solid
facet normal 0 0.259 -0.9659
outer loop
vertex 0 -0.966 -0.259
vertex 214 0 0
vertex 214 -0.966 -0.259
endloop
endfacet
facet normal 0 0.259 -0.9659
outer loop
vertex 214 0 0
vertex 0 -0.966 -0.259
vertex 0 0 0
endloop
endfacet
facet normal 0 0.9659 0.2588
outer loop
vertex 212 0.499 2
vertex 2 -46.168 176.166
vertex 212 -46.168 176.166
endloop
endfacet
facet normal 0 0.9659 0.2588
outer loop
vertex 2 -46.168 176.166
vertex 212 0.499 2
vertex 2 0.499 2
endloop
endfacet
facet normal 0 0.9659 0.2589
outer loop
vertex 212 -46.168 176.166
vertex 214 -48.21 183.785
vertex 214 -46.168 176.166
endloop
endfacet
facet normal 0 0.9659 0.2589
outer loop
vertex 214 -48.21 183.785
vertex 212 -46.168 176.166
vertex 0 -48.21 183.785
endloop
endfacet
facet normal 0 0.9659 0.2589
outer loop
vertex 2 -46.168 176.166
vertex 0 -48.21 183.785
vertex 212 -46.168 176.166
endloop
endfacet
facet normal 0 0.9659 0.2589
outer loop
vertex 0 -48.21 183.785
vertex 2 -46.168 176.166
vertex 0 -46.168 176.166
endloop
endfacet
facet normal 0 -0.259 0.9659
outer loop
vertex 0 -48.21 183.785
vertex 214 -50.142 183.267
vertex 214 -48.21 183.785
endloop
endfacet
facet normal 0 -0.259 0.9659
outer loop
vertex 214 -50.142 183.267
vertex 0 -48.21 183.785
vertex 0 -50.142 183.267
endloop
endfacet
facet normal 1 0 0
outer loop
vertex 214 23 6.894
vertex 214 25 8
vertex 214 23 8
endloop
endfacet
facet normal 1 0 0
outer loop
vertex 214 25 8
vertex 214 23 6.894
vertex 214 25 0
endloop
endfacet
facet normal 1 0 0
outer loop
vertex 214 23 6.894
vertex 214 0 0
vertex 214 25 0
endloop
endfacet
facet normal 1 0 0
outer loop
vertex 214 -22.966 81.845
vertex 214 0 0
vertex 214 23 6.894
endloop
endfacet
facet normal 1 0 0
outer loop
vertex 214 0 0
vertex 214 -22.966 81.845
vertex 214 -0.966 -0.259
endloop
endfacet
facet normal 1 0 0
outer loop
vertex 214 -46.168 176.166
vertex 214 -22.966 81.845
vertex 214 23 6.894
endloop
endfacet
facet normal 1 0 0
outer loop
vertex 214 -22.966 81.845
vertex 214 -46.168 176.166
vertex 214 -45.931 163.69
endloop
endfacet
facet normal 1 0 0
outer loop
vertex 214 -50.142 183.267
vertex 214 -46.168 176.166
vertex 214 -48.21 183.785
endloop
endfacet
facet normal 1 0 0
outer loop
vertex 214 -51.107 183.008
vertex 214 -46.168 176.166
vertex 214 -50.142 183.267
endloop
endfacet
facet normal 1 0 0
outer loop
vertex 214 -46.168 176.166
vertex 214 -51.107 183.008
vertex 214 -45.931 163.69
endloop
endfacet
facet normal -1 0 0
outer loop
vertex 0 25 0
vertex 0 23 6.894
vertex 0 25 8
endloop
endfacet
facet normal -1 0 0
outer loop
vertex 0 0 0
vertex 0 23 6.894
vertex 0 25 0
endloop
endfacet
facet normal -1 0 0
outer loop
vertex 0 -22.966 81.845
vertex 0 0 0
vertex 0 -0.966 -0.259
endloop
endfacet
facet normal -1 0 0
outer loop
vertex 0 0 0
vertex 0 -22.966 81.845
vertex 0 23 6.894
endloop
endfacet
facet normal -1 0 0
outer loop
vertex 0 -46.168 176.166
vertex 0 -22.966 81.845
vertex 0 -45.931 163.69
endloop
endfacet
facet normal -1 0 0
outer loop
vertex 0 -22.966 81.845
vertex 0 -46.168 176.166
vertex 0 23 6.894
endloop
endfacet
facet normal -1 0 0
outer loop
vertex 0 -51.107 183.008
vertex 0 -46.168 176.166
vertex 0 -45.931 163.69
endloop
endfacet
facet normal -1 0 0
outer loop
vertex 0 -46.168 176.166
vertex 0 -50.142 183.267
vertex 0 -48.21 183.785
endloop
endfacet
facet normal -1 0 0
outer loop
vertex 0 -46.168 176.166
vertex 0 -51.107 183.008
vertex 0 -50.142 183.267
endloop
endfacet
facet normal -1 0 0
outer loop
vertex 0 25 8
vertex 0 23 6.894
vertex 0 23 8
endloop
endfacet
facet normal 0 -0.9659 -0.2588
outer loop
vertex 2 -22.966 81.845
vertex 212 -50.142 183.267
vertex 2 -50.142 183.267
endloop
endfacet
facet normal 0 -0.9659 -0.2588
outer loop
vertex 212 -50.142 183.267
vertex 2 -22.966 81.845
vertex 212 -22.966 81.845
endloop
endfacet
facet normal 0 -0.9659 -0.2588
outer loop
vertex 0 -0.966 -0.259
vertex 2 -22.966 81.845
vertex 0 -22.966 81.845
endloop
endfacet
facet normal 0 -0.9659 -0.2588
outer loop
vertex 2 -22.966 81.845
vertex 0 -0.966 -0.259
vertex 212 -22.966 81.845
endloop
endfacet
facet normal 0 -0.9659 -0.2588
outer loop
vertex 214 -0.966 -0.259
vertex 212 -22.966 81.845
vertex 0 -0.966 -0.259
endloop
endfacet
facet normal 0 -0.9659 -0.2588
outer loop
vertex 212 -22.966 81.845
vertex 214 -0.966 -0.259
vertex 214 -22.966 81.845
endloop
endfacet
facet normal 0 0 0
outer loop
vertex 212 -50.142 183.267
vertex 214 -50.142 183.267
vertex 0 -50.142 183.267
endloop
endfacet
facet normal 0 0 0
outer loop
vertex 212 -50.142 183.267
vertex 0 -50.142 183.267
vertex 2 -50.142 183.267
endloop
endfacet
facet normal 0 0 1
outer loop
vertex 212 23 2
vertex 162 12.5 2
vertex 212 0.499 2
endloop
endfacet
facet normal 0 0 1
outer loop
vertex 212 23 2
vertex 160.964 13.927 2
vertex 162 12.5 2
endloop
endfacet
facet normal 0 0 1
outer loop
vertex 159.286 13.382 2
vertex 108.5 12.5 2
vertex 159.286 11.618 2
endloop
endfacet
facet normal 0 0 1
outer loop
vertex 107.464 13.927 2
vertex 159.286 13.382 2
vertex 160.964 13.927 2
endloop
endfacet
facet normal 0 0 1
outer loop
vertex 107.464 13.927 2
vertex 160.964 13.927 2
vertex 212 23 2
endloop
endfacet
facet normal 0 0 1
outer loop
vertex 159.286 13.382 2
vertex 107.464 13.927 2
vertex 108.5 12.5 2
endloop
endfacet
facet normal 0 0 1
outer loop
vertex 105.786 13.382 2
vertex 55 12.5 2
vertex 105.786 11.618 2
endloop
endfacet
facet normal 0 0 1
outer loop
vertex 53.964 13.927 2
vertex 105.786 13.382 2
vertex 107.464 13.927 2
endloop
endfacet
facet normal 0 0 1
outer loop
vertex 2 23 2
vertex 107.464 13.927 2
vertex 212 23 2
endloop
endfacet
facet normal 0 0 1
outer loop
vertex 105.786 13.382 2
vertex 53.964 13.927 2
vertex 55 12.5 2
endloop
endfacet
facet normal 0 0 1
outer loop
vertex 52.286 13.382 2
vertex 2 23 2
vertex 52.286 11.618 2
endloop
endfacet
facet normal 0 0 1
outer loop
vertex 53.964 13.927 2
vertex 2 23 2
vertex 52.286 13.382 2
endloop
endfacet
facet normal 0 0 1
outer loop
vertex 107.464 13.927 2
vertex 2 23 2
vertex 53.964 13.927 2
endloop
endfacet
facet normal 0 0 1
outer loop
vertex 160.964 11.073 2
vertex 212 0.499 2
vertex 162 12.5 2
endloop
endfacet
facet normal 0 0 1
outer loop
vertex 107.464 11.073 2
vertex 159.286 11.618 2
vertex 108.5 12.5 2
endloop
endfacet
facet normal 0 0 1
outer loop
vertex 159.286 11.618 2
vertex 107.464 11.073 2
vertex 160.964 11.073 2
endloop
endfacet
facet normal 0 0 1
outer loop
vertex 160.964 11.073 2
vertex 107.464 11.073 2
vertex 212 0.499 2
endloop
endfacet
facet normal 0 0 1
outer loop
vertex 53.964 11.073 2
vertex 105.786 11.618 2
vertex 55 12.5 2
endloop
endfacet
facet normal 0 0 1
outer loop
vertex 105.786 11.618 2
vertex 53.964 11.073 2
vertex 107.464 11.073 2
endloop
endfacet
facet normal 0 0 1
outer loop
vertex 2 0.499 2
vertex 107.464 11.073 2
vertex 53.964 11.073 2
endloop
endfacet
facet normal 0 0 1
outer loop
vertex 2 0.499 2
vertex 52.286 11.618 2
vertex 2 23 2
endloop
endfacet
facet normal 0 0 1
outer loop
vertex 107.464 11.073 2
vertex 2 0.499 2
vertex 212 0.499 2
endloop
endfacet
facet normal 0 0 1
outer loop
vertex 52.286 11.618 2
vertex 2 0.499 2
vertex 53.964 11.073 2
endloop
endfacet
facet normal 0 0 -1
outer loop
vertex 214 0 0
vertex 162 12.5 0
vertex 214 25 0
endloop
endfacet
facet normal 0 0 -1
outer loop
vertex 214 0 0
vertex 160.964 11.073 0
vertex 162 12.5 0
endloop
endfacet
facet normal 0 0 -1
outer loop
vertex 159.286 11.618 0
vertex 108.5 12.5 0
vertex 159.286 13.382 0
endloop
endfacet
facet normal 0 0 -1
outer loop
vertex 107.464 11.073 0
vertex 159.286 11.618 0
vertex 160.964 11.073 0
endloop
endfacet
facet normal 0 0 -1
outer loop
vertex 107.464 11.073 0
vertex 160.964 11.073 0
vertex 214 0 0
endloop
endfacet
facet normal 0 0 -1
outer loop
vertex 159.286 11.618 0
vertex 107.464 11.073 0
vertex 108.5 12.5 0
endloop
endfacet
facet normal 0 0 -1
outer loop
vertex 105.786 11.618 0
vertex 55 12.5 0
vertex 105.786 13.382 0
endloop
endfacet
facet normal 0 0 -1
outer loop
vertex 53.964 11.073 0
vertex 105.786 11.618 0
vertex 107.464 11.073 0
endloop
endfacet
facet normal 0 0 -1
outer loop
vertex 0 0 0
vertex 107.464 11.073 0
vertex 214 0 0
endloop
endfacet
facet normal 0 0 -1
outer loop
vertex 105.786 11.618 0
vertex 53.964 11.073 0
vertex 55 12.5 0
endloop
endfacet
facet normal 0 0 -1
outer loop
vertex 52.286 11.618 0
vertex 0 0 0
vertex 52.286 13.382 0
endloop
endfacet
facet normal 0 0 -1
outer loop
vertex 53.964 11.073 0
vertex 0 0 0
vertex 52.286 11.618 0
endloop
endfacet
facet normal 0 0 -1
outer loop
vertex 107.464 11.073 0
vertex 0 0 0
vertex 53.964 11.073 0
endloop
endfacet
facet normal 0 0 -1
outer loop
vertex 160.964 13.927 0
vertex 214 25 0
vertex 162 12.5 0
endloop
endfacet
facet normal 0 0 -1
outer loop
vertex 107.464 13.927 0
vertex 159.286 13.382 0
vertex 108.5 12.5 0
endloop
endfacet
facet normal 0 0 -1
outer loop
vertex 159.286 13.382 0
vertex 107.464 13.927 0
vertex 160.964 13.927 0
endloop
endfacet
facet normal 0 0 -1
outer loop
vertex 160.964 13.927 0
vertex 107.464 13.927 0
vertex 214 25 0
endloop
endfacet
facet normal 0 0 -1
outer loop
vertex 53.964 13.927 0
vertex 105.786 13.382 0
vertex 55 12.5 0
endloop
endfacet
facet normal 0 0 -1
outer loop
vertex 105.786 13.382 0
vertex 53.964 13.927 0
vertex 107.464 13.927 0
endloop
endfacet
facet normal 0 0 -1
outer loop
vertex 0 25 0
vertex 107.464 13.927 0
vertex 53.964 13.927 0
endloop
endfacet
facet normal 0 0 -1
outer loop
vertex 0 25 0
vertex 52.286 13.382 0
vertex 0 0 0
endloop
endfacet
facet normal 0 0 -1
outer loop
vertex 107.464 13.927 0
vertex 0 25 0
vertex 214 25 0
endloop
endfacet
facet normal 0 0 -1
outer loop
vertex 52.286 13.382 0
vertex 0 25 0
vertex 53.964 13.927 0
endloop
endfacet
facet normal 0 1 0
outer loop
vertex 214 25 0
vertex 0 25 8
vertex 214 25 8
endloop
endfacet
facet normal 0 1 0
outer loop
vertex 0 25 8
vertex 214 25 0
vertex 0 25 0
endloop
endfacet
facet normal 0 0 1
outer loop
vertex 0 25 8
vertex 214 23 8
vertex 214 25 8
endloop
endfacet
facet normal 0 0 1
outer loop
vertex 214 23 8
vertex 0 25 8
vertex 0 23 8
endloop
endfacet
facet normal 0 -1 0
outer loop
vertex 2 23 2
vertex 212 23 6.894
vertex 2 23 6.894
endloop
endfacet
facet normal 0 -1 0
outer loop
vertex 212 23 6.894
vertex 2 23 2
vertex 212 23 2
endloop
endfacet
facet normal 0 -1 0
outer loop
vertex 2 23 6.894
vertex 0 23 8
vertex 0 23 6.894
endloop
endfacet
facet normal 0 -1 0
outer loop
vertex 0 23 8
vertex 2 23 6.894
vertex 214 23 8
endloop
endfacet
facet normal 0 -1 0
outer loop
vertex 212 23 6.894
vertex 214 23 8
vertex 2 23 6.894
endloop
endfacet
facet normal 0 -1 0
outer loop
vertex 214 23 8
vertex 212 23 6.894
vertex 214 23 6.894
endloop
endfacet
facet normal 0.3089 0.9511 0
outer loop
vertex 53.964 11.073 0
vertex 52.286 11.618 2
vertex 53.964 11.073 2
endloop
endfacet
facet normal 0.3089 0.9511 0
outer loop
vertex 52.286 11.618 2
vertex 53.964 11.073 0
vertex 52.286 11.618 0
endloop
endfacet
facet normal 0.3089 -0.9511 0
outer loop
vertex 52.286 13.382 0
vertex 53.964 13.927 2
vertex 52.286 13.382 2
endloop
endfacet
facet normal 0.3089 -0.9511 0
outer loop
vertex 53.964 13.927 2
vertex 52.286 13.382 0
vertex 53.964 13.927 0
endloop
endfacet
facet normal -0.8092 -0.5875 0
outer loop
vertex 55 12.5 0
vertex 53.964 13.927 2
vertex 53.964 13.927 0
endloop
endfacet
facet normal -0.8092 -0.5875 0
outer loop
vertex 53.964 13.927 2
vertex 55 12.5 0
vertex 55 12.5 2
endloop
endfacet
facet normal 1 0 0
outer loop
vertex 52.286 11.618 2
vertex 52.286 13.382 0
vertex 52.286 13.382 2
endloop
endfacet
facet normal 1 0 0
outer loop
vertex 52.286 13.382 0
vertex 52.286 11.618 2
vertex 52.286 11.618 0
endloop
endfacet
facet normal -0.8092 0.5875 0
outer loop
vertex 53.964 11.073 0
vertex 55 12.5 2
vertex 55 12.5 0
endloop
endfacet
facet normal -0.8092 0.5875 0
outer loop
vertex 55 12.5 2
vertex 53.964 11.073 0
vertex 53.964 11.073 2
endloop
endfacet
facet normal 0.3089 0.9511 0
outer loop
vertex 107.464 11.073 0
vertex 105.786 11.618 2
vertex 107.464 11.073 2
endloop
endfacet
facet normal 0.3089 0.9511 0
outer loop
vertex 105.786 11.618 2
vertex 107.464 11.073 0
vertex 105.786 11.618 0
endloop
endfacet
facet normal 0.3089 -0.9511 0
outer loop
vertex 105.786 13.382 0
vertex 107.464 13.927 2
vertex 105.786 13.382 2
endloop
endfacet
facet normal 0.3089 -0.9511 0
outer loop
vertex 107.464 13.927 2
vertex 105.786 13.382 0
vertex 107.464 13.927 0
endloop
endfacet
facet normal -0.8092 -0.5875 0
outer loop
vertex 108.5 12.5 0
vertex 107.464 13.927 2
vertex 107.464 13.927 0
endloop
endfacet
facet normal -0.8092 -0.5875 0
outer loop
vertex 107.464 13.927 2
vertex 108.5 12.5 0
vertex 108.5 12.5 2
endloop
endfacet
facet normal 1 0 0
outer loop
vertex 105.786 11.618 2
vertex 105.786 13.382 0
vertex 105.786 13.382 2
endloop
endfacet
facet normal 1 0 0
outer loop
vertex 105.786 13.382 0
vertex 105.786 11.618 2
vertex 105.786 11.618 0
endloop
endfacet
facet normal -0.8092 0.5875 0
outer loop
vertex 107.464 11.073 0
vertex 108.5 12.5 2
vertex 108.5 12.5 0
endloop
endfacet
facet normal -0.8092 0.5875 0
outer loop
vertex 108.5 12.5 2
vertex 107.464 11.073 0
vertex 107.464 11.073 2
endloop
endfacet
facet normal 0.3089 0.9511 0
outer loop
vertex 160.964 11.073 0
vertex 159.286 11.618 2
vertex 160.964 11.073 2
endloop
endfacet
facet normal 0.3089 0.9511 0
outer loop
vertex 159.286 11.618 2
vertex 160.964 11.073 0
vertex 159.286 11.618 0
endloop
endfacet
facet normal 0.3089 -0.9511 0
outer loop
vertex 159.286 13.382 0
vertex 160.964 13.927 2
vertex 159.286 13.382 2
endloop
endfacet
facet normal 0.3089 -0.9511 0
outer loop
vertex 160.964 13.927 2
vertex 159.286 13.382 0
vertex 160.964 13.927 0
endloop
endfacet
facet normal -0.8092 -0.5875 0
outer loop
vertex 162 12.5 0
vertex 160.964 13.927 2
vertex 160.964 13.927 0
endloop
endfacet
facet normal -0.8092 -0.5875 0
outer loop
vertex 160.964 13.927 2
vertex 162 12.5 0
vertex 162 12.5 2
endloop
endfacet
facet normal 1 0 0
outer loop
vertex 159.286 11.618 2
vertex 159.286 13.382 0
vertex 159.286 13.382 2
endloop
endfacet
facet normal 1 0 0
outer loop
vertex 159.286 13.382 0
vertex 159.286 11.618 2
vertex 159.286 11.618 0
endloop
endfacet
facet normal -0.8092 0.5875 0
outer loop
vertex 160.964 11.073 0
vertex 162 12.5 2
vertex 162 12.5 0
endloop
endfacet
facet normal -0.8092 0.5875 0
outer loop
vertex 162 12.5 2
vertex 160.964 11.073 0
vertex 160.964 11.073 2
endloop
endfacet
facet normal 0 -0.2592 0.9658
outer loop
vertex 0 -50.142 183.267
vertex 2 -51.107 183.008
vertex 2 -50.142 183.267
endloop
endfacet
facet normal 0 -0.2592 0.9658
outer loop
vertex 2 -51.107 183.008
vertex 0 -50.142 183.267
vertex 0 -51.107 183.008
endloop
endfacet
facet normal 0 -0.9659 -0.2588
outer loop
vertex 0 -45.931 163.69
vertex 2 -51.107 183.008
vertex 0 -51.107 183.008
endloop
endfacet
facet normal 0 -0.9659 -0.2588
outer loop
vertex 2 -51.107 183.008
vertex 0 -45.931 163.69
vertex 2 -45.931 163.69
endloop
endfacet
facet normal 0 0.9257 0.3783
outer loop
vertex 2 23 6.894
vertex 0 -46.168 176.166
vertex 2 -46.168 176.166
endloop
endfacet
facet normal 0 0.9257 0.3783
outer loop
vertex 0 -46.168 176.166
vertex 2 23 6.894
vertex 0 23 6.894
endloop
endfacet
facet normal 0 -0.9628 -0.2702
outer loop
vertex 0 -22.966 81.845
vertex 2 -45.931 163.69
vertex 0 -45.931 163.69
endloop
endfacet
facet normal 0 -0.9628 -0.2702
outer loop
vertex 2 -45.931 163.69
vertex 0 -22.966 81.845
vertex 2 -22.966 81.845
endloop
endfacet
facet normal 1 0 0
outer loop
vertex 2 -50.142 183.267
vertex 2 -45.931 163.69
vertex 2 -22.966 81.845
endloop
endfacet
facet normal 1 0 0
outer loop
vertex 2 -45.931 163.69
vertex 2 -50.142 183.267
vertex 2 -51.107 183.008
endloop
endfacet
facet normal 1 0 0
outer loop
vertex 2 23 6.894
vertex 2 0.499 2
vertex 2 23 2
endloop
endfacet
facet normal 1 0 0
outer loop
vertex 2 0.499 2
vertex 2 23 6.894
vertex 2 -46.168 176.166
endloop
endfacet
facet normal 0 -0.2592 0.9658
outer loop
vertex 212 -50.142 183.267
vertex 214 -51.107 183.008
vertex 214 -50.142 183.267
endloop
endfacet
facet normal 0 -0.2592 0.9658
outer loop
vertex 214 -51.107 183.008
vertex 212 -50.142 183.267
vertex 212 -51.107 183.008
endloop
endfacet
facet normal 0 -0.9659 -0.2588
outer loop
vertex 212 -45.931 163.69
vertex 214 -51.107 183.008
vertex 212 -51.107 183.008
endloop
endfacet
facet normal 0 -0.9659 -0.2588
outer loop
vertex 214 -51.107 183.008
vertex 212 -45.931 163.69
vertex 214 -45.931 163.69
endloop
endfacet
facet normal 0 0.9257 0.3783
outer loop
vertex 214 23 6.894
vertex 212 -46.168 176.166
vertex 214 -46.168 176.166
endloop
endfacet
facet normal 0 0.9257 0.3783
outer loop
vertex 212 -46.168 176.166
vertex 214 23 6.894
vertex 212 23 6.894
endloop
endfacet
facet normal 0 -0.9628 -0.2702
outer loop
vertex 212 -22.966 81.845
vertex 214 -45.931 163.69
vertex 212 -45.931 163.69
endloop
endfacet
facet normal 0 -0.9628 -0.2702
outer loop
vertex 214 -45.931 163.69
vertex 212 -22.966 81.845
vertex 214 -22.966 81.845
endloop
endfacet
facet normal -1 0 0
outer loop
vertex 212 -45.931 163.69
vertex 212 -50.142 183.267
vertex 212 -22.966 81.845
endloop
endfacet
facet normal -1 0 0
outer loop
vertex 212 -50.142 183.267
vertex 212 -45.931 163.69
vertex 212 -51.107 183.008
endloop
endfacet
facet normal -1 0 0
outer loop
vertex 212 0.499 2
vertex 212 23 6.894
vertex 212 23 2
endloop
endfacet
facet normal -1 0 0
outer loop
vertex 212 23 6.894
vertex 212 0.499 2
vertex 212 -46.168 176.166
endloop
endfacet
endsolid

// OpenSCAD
// Sheet Music Holder for A4 sheets
// Designed for BambuLab A1 (200x200x200mm build volume)
// Must be printed diagonally

// Parameters
back_width = 214;        // Width of back panel (214mm for A4 + margin)
height = 190;            // Height constraint from printer
wall_thickness = 2;      // Wall thickness
base_depth = 25;         // Depth of the base/lip for sheets to rest on
back_angle = 15;         // Angle of the back support (degrees from vertical)
gutter_height = 8;       // Height of the lip/gutter to hold sheets

// Main module
module sheet_music_holder() {
    difference() {
        // Main body
        union() {
            // Back panel - angled for better viewing
            rotate([back_angle, 0, 0])
                translate([0, -wall_thickness/2, 0])
                    cube([back_width, wall_thickness, height]);
            
            // Base/bottom platform
            cube([back_width, base_depth, wall_thickness]);
            
            // Front lip/gutter to hold sheets
            translate([0, base_depth - wall_thickness, 0])
                cube([back_width, wall_thickness, gutter_height]);
        }
        
        // Optional: small drainage holes in base (in case of moisture)
        for(i = [1:3]) {
            translate([back_width/4 * i, base_depth/2, -1])
                cylinder(h = wall_thickness + 2, d = 3);
        }
    }
    
    // Side supports for additional stability
    // Left side
    translate([0, 0, 0])
        side_support();
    
    // Right side  
    translate([back_width - wall_thickness, 0, 0])
        side_support();
}

// Side support module
module side_support() {
    hull() {
        // Bottom connection point
        cube([wall_thickness, base_depth, wall_thickness]);
        
        // Top connection point (accounting for back panel angle)
        rotate([back_angle, 0, 0])
            translate([0, -wall_thickness, height - 20])
                cube([wall_thickness, wall_thickness, 20]);
    }
}

// Render the holder
sheet_music_holder();

// Print statistics
echo("=== PRINT STATISTICS ===");
echo(str("Back width: ", back_width, "mm"));
echo(str("Height: ", height, "mm"));  
echo(str("Base depth: ", base_depth, "mm"));
echo(str("Diagonal print dimension: ", sqrt(back_width*back_width + base_depth*base_depth), "mm"));
echo(str("Will this fit diagonally in 200mm? ", sqrt(back_width*back_width + base_depth*base_depth) < 200 ? "YES" : "NO"));

// Printing orientation guide
translate([0, -50, 0]) {
    color("red") {
        text("PRINT ORIENTATION:", size=6);
        translate([0, -10, 0])
            text("Rotate 45° on print bed", size=5);
        translate([0, -20, 0])
            text("Use brim for adhesion", size=5);
    }
}
